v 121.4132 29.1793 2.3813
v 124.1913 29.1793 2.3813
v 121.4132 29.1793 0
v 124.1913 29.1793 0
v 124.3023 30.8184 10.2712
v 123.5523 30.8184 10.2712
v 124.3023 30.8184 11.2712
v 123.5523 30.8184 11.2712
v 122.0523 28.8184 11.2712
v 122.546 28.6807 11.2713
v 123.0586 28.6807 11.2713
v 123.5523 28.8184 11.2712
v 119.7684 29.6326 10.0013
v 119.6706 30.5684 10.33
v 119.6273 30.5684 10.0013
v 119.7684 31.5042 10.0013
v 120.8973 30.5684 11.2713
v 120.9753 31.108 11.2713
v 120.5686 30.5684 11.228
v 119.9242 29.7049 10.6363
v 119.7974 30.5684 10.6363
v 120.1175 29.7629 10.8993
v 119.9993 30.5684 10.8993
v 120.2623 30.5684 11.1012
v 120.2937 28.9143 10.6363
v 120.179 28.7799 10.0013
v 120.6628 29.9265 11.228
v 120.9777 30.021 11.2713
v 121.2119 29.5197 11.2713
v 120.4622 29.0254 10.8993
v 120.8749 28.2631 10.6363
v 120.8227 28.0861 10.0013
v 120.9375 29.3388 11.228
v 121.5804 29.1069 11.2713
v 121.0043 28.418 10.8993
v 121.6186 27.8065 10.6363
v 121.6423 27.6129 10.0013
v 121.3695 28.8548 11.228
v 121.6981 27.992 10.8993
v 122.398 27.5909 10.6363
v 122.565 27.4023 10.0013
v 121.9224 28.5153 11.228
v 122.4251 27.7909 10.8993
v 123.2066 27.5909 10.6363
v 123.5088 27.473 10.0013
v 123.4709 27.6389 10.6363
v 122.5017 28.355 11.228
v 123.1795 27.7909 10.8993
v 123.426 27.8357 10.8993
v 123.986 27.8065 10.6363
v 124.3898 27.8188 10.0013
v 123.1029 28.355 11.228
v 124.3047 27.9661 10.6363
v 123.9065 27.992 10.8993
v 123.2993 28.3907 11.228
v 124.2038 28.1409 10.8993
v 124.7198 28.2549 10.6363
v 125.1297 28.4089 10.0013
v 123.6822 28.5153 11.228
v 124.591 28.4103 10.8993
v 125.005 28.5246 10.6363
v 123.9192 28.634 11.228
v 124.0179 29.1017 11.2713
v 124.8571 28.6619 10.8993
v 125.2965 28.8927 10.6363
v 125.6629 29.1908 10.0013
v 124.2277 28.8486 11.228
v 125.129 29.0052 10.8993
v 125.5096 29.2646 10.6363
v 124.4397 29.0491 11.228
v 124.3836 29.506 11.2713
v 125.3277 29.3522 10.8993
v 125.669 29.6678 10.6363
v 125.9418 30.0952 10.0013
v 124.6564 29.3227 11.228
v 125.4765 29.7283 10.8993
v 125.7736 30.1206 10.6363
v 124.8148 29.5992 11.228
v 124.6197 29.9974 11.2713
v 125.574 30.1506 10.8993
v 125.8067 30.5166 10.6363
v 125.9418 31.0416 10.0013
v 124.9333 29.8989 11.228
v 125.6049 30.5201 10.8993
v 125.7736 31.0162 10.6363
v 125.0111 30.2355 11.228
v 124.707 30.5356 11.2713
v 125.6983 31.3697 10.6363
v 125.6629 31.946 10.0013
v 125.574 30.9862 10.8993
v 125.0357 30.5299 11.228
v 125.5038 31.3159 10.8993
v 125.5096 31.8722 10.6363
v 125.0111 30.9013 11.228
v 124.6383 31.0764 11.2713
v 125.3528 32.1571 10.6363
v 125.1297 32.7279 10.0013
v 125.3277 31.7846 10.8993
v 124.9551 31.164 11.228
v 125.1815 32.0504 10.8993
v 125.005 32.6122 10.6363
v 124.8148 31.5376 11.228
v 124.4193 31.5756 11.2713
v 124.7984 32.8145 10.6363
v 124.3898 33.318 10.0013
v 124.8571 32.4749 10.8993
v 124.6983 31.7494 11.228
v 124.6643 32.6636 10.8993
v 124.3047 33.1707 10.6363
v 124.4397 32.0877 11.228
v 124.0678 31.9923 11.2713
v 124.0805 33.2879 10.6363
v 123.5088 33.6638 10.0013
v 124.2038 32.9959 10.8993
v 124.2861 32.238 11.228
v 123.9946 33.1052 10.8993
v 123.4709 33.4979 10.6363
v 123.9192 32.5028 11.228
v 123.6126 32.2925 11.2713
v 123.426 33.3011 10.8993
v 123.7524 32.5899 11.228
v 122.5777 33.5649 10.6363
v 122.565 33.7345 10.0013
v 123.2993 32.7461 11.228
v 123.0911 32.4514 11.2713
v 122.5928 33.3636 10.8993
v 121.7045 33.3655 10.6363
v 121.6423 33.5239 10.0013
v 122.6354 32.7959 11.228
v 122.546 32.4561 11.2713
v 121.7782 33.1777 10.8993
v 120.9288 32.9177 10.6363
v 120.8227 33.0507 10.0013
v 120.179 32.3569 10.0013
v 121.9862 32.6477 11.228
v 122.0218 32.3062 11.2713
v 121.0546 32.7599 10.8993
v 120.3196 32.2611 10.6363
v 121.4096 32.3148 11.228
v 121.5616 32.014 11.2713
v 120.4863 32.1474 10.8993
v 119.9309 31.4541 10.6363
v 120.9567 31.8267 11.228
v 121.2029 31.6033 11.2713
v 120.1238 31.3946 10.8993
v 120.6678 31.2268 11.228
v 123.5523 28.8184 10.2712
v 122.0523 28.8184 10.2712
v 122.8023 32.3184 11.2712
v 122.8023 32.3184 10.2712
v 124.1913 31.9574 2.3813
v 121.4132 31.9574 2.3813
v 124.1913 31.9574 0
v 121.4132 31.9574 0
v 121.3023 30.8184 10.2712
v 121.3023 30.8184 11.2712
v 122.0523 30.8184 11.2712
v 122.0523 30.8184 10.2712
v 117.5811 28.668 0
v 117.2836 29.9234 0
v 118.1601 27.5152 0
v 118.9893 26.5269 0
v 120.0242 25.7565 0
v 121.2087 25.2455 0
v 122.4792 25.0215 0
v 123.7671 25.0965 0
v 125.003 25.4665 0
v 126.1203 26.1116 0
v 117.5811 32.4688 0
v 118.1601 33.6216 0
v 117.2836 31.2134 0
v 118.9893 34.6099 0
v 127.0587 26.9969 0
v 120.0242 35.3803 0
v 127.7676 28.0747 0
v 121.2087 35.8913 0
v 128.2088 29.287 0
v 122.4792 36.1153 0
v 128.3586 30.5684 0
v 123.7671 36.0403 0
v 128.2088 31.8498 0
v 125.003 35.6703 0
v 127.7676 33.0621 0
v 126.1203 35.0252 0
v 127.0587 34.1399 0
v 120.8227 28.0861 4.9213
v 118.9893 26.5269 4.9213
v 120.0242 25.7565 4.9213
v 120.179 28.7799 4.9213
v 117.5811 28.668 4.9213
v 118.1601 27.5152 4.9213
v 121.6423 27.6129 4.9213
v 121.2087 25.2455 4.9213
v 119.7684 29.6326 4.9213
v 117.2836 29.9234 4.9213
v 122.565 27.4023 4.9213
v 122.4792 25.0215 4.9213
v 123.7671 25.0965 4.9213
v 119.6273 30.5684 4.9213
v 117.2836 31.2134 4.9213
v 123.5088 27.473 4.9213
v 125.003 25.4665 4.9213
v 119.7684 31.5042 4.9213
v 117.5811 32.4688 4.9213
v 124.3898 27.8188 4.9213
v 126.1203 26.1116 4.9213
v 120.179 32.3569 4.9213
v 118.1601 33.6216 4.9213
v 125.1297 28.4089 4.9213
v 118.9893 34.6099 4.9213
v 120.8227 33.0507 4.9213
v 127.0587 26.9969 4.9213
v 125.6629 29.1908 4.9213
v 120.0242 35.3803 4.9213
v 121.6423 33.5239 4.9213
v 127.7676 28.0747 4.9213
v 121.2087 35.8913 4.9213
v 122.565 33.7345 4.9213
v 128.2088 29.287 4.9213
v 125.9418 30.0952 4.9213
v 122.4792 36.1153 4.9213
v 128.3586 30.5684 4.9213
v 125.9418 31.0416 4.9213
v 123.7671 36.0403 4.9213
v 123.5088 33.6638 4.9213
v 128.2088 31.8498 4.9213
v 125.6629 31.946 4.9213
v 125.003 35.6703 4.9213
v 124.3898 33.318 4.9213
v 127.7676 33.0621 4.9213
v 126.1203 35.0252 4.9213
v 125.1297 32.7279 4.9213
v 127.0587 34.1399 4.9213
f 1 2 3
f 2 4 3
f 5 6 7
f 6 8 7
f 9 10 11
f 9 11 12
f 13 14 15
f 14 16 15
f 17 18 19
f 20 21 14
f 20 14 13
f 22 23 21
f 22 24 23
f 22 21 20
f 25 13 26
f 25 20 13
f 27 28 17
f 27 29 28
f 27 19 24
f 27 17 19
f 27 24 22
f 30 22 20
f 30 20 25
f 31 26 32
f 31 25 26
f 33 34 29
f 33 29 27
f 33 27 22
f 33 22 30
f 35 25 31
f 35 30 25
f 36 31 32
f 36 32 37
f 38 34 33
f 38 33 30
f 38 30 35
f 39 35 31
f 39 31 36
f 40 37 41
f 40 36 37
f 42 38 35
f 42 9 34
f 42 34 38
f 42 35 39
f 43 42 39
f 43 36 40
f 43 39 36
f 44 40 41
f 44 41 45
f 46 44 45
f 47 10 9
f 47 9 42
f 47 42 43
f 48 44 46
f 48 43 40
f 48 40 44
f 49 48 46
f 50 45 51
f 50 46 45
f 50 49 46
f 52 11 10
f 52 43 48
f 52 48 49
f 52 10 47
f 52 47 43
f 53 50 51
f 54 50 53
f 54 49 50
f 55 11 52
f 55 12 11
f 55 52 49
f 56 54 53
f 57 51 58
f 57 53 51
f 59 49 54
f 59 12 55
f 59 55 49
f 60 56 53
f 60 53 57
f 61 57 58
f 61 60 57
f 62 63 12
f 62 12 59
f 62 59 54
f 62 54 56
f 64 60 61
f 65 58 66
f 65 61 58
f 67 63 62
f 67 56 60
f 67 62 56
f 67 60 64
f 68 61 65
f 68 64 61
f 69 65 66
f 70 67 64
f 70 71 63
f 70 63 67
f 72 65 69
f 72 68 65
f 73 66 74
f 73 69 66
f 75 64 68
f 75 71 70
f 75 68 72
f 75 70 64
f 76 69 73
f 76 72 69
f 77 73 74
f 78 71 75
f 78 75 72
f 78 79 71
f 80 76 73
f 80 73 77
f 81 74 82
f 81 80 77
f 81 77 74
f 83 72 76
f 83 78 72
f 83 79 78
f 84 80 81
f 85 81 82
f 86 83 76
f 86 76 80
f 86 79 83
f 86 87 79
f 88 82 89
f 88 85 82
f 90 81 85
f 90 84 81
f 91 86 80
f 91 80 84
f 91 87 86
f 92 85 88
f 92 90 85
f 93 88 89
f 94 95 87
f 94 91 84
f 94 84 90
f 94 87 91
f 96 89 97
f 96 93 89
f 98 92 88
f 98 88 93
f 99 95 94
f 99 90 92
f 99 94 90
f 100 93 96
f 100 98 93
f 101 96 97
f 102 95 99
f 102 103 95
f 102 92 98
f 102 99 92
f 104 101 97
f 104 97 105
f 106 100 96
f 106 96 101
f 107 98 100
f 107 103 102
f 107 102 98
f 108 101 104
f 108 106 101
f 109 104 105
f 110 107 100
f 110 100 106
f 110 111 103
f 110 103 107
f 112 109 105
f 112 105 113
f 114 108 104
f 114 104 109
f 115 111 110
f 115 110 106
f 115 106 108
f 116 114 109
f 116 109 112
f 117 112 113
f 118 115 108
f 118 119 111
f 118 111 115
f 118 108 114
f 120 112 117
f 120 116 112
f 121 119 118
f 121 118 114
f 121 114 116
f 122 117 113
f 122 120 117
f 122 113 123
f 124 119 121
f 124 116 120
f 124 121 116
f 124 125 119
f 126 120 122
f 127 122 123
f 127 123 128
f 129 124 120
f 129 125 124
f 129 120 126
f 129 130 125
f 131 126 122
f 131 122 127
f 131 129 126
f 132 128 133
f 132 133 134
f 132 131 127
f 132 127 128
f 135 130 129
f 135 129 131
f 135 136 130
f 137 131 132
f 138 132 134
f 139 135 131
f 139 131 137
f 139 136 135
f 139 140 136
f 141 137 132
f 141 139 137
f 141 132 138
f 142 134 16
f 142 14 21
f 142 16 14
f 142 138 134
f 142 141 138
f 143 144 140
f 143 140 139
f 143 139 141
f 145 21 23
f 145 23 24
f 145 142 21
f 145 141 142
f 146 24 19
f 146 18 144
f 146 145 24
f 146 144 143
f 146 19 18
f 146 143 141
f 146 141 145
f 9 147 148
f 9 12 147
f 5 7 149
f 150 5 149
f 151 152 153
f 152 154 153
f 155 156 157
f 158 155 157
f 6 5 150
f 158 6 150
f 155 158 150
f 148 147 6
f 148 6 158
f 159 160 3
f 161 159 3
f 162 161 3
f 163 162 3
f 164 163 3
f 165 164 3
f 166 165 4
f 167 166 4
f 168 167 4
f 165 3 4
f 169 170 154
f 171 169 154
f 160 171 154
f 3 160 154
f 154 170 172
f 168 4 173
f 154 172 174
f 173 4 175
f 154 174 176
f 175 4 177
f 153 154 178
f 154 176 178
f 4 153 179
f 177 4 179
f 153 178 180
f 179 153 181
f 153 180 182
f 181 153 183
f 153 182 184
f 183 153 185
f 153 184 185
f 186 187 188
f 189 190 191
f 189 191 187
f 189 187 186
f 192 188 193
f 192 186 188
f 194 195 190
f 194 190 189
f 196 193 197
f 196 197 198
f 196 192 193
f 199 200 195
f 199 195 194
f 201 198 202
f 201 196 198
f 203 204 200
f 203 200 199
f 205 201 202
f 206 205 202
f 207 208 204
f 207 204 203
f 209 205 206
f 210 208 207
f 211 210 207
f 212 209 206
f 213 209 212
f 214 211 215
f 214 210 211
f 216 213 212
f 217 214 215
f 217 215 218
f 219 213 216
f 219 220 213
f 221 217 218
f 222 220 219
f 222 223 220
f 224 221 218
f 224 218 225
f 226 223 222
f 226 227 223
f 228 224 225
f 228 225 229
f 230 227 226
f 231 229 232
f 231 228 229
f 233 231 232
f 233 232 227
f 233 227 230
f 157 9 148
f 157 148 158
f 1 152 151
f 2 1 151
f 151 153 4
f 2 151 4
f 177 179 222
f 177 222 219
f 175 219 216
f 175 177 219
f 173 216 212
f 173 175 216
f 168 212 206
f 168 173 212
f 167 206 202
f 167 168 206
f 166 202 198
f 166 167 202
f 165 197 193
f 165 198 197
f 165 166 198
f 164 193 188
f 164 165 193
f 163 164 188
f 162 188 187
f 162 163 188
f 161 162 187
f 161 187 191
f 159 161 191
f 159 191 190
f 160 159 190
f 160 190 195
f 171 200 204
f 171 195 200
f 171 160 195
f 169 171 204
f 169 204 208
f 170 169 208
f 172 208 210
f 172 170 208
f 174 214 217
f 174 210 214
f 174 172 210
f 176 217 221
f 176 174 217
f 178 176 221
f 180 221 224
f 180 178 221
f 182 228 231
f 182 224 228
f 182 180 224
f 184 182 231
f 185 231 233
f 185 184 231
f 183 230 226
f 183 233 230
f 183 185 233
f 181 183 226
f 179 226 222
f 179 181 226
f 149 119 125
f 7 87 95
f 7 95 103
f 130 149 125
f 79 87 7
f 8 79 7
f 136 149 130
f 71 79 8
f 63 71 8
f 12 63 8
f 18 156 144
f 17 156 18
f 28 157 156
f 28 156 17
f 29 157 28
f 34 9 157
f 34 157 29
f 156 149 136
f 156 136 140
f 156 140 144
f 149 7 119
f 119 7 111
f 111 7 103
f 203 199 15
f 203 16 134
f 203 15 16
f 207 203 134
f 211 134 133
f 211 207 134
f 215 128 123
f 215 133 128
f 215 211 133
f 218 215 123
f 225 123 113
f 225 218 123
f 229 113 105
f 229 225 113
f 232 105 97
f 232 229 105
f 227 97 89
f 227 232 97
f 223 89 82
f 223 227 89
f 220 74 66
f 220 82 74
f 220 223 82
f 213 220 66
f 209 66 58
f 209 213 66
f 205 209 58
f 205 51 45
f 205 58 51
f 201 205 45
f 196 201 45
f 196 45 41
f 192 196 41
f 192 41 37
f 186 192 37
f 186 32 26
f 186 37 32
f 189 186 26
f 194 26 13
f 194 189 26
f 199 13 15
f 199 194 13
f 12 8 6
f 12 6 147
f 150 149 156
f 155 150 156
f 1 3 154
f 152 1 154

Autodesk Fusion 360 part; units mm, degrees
sketch "Sketch1" plane through (0, 0, 0) normal (0, 0, 1) x (1, 0, 0)
  line L0 (121.4132, 31.9574) -> (124.1913, 31.9574)
  line L1 (124.1913, 31.9574) -> (124.1913, 29.1793)
  line L2 (124.1913, 29.1793) -> (121.4132, 29.1793)
  line L3 (121.4132, 29.1793) -> (121.4132, 31.9574)
  circle A0 centre (122.8023, 30.5684) radius 5.5563
  dimension "d1" = 2.7781
  dimension "d2" = 2.7781
  dimension "d17" = 11.1125
extrude "Extrude1" add sketch "Sketch1" along normal blind 2.3813
extrude "Extrude4" add sketch "Sketch1" along normal blind 2.54 from surface at 2.3813 contours L0 L1 L2 L3 | A0
sketch "Sketch2" plane through (0, 0, 4.9213) normal (0, 0, 1) x (-1, 0, 0)
  line L0 (-124.1913, -29.1793) -> (-121.4132, -29.1793)
  line L1 (-121.4132, -29.1793) -> (-121.4132, -31.9574)
  line L2 (-121.4132, -31.9574) -> (-124.1913, -31.9574)
  line L3 (-124.1913, -31.9574) -> (-124.1913, -29.1793)
  circle A0 centre (-122.8023, -30.5684) radius 3.175
  circle A1 centre (-122.8023, -30.5684) radius 5.5562
  circle A2 centre (-122.8023, -30.5684) radius 5.5562
  point P0 (-121.4132, -30.5684)
  point P1 (-122.8023, -31.9574)
  dimension "d6" = 6.35
extrude "Extrude2" add sketch "Sketch2" along normal blind 6.35 contours L0 L1 L2 L3 | A0
fillet "Fillet1" radius 1.27 1 edges at (125.7624, 31.7165, 11.2712)
sketch "Sketch3" plane through (0, 0, 11.2712) normal (0, 0, 1) x (-1, 0, 0)
  circle A0 centre (-122.8023, -30.5684) radius 1.905
  line L0 (-122.0523, -30.8184) -> (-123.5523, -30.8184) construction
  line L1 (-123.5523, -30.8184) -> (-123.5523, -28.8184)
  line L2 (-123.5523, -28.8184) -> (-122.0523, -28.8184)
  line L3 (-122.0523, -28.8184) -> (-122.0523, -30.8184)
  line L4 (-121.3023, -30.8184) -> (-124.3023, -30.8184)
  line L5 (-124.3023, -30.8184) -> (-122.8023, -32.3184)
  line L6 (-122.8023, -32.3184) -> (-121.3023, -30.8184)
  line L7 (-122.8023, -32.3184) -> (-122.8023, -28.8184) construction
  point P0 (-122.8023, -30.8184)
  point P1 (-122.8023, -30.5684)
  dimension "d11" = 1.5
  dimension "d12" = 2
  dimension "d13" = 1.5
  dimension "d14" = 3
extrude "Extrude3" cut sketch "Sketch3" against normal blind 1 contours L1 L2 L3 L4 | L4 L5 L6
equation "d1 = ( 7 / 64 ) * 1 in"
equation "d2 = ( 7 / 64 ) * 1 in"
equation "d4 = ( 3 / 32 ) * 1 in"
equation "d17 = ( 7 / 16 ) * 1 in"
